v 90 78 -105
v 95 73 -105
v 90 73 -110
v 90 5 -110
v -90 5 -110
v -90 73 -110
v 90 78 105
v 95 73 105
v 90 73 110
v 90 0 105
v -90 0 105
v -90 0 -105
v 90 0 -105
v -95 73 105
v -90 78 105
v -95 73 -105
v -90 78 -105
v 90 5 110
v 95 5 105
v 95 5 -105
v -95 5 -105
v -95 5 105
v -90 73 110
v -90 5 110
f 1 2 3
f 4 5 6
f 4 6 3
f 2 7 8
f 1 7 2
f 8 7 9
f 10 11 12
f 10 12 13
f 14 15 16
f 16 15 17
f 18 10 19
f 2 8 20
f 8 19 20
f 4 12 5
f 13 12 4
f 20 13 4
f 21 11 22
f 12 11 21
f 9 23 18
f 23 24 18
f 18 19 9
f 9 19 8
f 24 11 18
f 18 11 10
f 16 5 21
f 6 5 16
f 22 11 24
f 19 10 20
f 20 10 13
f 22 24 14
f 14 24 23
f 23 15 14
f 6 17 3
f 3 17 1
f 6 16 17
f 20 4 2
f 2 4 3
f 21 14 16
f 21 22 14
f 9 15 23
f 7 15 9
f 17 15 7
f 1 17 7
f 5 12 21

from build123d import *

# Parameters (mm, degrees)
SKETCH_1_W      = 190
SKETCH_1_H      = 220
EXTRUDE_1_DEPTH = 78
CHAMFER_1_SIZE  = 5


with BuildPart() as part:
    # 草图1 → 凸台-拉伸1 (new body)
    with BuildSketch(Plane(origin=(0, 0, 0), x_dir=(1, 0, 0), z_dir=(0, 1, 0))):
        Rectangle(SKETCH_1_W, SKETCH_1_H)
    extrude(amount=EXTRUDE_1_DEPTH)

    # 倒角1
    chamfer_1_edges = [part.edges().sort_by_distance(p)[0] for p in [
        (-95, 78, 0),
        (0, 78, 110),
        (95, 78, 0),
        (0, 0, 110),
        (-95, 0, 0),
        (0, 0, -110),
        (95, 0, 0),
        (95, 39, 110),
        (-95, 39, 110),
        (-95, 39, -110),
        (95, 39, -110),
        (0, 78, -110),
    ]]
    chamfer(chamfer_1_edges, length=CHAMFER_1_SIZE)


solid = part.part
